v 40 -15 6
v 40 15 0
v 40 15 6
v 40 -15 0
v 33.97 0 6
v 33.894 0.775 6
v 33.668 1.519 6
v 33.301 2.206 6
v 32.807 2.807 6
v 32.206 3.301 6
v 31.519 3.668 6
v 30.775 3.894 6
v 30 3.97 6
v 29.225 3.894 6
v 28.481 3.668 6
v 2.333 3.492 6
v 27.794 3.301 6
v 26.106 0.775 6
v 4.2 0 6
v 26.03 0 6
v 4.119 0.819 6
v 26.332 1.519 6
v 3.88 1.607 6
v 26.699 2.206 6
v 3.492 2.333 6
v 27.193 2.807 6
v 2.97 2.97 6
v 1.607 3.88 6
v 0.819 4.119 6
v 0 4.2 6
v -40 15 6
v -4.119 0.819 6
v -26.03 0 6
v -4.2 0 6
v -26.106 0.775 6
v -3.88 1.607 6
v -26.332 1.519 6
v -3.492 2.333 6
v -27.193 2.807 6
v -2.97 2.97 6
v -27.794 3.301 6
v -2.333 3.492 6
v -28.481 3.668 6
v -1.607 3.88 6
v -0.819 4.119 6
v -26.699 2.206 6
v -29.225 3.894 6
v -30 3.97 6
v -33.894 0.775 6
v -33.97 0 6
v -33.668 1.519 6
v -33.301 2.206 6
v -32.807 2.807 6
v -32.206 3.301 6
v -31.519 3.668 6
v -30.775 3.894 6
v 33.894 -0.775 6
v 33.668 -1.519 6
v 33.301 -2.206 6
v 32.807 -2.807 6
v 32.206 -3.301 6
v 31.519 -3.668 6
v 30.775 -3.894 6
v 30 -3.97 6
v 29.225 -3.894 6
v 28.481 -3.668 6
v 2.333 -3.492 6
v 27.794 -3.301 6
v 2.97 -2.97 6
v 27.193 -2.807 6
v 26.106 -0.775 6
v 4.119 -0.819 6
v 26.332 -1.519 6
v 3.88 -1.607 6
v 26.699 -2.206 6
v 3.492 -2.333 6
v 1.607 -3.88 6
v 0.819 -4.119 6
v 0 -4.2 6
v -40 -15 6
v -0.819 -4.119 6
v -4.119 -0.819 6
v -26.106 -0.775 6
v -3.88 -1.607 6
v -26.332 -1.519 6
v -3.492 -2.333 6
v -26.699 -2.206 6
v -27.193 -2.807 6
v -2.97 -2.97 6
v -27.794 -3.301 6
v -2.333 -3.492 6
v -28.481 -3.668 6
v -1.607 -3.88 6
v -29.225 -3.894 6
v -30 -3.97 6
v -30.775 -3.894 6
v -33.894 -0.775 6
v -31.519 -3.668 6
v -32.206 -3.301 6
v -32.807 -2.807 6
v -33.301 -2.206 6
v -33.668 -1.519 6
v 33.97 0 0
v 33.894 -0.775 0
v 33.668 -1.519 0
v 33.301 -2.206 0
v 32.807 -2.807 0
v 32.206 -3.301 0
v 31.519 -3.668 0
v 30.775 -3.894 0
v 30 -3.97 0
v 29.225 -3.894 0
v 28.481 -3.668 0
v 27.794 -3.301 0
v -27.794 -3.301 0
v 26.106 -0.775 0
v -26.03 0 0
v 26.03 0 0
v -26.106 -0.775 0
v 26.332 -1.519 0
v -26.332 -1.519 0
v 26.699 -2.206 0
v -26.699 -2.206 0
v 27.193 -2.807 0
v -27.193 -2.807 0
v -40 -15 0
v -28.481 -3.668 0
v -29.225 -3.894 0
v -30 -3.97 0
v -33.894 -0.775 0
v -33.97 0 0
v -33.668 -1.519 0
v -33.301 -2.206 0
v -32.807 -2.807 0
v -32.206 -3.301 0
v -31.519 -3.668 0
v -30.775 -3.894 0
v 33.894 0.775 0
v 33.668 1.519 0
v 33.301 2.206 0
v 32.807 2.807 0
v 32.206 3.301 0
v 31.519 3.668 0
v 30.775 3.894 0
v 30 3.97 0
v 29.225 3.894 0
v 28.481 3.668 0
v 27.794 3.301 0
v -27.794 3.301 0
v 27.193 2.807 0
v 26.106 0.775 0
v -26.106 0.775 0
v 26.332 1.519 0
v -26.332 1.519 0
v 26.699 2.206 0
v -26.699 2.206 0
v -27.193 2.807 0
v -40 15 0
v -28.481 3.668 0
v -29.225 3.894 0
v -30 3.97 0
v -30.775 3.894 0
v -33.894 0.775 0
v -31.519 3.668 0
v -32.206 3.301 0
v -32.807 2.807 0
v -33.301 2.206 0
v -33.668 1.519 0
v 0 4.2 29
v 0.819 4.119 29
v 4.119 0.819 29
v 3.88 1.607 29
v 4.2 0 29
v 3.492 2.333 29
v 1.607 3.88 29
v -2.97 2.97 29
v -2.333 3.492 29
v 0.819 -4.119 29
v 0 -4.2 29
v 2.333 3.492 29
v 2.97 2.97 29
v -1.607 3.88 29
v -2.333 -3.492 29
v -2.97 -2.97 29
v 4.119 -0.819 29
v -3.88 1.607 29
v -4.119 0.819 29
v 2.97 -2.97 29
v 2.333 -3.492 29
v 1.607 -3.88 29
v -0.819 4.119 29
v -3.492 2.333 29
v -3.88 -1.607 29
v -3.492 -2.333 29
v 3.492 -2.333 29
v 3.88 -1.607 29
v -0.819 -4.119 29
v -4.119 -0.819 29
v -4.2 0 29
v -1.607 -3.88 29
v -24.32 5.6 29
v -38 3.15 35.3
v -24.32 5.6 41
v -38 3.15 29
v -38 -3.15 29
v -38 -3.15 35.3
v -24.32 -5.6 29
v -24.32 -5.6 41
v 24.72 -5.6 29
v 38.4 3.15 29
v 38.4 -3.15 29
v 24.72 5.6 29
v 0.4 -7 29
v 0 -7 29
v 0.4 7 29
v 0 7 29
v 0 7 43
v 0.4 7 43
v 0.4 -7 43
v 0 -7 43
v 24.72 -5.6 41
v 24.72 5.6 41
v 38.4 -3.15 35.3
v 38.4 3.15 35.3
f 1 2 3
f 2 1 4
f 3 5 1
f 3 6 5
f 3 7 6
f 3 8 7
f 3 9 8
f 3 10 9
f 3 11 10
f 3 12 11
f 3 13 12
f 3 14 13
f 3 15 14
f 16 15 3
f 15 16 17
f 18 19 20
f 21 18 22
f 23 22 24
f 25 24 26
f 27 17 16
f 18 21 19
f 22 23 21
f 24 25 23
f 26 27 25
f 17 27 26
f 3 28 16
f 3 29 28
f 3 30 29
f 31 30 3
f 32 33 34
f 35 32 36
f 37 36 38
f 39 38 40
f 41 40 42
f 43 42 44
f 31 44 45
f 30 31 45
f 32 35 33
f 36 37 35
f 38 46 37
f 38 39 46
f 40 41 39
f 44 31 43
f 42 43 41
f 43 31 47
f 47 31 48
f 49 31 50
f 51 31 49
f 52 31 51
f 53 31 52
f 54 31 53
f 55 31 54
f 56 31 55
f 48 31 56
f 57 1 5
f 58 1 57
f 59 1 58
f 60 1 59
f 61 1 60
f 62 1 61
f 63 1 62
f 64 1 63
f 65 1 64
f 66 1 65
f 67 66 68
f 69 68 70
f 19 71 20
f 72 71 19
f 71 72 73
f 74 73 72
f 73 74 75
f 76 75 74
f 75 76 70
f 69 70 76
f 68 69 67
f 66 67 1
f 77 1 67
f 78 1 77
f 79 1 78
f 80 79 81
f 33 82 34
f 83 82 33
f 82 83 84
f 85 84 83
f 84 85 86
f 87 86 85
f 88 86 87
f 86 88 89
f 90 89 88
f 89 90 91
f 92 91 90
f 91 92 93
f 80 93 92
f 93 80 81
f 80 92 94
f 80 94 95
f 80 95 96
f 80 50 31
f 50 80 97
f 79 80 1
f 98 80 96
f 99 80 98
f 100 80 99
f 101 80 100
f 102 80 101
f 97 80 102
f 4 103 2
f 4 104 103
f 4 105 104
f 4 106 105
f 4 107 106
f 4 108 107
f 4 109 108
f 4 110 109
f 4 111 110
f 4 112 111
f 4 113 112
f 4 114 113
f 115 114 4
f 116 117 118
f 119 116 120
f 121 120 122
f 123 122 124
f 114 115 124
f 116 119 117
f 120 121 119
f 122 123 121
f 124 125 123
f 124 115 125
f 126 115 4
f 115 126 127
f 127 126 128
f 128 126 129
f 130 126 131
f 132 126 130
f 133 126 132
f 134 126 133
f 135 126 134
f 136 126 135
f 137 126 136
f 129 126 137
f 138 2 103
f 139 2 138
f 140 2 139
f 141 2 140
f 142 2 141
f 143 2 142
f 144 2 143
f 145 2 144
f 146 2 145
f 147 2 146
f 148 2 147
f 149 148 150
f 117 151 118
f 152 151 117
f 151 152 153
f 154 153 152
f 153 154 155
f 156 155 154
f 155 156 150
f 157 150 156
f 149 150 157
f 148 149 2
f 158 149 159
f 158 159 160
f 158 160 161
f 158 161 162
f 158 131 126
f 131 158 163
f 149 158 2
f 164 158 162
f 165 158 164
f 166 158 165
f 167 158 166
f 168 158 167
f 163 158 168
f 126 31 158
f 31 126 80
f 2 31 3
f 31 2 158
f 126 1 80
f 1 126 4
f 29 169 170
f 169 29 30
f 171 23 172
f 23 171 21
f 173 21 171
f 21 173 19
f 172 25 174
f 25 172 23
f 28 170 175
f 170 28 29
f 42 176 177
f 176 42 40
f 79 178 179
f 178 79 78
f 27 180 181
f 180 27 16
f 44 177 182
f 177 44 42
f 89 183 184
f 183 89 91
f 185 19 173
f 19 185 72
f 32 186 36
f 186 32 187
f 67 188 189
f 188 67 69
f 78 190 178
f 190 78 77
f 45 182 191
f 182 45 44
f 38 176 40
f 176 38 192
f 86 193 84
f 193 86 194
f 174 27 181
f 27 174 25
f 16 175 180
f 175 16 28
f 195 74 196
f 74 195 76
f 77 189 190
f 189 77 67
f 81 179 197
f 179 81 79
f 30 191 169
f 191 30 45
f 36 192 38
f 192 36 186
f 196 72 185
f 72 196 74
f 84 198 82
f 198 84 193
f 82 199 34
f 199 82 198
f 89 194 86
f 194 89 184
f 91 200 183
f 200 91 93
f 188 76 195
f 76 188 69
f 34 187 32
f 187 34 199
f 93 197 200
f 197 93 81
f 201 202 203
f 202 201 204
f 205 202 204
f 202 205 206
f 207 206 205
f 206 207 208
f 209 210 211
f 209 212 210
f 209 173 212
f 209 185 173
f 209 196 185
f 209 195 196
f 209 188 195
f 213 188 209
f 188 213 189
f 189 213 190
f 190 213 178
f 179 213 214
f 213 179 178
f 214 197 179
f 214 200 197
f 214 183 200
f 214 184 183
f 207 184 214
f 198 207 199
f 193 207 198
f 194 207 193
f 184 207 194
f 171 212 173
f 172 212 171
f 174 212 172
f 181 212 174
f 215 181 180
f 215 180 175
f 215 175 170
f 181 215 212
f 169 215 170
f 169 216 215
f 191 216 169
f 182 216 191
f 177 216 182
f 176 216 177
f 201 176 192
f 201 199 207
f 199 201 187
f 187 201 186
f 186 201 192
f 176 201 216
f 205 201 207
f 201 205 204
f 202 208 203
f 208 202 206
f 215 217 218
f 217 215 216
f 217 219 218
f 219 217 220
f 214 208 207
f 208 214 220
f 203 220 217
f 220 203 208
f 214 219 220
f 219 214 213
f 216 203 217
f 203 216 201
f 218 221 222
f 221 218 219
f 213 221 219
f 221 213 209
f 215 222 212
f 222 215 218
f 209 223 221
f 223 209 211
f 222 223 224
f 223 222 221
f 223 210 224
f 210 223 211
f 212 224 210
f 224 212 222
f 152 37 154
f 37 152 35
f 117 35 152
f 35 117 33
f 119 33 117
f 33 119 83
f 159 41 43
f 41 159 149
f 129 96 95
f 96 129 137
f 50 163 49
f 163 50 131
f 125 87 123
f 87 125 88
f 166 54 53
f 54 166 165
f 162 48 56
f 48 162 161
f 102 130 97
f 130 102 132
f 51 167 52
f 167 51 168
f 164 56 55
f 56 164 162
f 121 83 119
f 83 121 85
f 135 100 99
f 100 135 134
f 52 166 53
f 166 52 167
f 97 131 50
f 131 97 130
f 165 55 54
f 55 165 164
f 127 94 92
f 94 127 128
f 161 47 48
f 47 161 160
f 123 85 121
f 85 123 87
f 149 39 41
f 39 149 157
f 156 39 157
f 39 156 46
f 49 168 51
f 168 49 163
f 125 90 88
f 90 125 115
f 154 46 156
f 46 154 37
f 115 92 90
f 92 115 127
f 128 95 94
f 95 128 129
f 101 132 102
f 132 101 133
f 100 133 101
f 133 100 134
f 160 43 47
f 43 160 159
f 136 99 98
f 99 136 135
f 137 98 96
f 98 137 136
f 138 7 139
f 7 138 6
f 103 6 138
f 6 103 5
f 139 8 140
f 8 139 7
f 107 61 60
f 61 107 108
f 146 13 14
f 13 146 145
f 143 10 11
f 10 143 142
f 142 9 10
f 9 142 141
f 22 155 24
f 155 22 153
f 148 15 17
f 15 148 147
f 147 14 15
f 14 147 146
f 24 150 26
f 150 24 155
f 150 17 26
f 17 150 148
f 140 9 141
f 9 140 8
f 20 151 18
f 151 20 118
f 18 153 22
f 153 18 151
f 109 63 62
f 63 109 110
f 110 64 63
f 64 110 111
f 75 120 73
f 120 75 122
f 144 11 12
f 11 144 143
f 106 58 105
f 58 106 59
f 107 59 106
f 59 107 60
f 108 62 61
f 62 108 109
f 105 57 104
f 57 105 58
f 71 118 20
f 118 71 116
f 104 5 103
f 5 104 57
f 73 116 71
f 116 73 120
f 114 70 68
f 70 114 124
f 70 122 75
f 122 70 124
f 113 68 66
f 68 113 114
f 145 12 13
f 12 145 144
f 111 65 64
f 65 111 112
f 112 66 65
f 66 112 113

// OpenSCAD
$fn = 32;

// ----------------------------------------------------------------------
// Boat cleat: 80 mm base, horn 36 mm up
// ----------------------------------------------------------------------

// --- parameters (mm) ---
base_l = 80;              // base length
base_w = 30;              // base width
base_t = 6;               // base thickness
horn_len = 76;            // horn length
horn_d = 14;              // horn diameter at the middle
horn_z = 36;              // horn axis height
end_drop = 8;             // how far the horn tips drop
post_d = 8.4;             // centre post diameter
holes_d = 7.94;           // fixing holes
hole_x = 30;              // fixing hole spacing

difference() {
  union() {
    translate([-40, -15, 0]) cube([base_l, base_w, base_t]);
    /* centre post, sunk 1 mm into the base */
    translate([0, 0, 5]) cylinder(h = 31, d = post_d);
    /* horn: a hull chain of boxes, full in the middle and lighter at the tips */
    hull() {
      translate([-38, -3.15, 29]) cube([0.4, 6.3, 6.3], center = false);
      translate([-24.32, -5.6, 29]) cube([0.4, 11.2, 12], center = false);
    }
    hull() {
      translate([-24.32, -5.6, 29]) cube([0.4, 11.2, 12], center = false);
      translate([0, -7, 29]) cube([0.4, 14, 14], center = false);
    }
    hull() {
      translate([0, -7, 29]) cube([0.4, 14, 14], center = false);
      translate([24.32, -5.6, 29]) cube([0.4, 11.2, 12], center = false);
    }
    hull() {
      translate([24.32, -5.6, 29]) cube([0.4, 11.2, 12], center = false);
      translate([38, -3.15, 29]) cube([0.4, 6.3, 6.3], center = false);
    }
  }
  translate([-30, 0, -2.5]) cylinder(h = base_t + 5, d = holes_d);
  translate([30, 0, -2.5]) cylinder(h = base_t + 5, d = holes_d);
}
